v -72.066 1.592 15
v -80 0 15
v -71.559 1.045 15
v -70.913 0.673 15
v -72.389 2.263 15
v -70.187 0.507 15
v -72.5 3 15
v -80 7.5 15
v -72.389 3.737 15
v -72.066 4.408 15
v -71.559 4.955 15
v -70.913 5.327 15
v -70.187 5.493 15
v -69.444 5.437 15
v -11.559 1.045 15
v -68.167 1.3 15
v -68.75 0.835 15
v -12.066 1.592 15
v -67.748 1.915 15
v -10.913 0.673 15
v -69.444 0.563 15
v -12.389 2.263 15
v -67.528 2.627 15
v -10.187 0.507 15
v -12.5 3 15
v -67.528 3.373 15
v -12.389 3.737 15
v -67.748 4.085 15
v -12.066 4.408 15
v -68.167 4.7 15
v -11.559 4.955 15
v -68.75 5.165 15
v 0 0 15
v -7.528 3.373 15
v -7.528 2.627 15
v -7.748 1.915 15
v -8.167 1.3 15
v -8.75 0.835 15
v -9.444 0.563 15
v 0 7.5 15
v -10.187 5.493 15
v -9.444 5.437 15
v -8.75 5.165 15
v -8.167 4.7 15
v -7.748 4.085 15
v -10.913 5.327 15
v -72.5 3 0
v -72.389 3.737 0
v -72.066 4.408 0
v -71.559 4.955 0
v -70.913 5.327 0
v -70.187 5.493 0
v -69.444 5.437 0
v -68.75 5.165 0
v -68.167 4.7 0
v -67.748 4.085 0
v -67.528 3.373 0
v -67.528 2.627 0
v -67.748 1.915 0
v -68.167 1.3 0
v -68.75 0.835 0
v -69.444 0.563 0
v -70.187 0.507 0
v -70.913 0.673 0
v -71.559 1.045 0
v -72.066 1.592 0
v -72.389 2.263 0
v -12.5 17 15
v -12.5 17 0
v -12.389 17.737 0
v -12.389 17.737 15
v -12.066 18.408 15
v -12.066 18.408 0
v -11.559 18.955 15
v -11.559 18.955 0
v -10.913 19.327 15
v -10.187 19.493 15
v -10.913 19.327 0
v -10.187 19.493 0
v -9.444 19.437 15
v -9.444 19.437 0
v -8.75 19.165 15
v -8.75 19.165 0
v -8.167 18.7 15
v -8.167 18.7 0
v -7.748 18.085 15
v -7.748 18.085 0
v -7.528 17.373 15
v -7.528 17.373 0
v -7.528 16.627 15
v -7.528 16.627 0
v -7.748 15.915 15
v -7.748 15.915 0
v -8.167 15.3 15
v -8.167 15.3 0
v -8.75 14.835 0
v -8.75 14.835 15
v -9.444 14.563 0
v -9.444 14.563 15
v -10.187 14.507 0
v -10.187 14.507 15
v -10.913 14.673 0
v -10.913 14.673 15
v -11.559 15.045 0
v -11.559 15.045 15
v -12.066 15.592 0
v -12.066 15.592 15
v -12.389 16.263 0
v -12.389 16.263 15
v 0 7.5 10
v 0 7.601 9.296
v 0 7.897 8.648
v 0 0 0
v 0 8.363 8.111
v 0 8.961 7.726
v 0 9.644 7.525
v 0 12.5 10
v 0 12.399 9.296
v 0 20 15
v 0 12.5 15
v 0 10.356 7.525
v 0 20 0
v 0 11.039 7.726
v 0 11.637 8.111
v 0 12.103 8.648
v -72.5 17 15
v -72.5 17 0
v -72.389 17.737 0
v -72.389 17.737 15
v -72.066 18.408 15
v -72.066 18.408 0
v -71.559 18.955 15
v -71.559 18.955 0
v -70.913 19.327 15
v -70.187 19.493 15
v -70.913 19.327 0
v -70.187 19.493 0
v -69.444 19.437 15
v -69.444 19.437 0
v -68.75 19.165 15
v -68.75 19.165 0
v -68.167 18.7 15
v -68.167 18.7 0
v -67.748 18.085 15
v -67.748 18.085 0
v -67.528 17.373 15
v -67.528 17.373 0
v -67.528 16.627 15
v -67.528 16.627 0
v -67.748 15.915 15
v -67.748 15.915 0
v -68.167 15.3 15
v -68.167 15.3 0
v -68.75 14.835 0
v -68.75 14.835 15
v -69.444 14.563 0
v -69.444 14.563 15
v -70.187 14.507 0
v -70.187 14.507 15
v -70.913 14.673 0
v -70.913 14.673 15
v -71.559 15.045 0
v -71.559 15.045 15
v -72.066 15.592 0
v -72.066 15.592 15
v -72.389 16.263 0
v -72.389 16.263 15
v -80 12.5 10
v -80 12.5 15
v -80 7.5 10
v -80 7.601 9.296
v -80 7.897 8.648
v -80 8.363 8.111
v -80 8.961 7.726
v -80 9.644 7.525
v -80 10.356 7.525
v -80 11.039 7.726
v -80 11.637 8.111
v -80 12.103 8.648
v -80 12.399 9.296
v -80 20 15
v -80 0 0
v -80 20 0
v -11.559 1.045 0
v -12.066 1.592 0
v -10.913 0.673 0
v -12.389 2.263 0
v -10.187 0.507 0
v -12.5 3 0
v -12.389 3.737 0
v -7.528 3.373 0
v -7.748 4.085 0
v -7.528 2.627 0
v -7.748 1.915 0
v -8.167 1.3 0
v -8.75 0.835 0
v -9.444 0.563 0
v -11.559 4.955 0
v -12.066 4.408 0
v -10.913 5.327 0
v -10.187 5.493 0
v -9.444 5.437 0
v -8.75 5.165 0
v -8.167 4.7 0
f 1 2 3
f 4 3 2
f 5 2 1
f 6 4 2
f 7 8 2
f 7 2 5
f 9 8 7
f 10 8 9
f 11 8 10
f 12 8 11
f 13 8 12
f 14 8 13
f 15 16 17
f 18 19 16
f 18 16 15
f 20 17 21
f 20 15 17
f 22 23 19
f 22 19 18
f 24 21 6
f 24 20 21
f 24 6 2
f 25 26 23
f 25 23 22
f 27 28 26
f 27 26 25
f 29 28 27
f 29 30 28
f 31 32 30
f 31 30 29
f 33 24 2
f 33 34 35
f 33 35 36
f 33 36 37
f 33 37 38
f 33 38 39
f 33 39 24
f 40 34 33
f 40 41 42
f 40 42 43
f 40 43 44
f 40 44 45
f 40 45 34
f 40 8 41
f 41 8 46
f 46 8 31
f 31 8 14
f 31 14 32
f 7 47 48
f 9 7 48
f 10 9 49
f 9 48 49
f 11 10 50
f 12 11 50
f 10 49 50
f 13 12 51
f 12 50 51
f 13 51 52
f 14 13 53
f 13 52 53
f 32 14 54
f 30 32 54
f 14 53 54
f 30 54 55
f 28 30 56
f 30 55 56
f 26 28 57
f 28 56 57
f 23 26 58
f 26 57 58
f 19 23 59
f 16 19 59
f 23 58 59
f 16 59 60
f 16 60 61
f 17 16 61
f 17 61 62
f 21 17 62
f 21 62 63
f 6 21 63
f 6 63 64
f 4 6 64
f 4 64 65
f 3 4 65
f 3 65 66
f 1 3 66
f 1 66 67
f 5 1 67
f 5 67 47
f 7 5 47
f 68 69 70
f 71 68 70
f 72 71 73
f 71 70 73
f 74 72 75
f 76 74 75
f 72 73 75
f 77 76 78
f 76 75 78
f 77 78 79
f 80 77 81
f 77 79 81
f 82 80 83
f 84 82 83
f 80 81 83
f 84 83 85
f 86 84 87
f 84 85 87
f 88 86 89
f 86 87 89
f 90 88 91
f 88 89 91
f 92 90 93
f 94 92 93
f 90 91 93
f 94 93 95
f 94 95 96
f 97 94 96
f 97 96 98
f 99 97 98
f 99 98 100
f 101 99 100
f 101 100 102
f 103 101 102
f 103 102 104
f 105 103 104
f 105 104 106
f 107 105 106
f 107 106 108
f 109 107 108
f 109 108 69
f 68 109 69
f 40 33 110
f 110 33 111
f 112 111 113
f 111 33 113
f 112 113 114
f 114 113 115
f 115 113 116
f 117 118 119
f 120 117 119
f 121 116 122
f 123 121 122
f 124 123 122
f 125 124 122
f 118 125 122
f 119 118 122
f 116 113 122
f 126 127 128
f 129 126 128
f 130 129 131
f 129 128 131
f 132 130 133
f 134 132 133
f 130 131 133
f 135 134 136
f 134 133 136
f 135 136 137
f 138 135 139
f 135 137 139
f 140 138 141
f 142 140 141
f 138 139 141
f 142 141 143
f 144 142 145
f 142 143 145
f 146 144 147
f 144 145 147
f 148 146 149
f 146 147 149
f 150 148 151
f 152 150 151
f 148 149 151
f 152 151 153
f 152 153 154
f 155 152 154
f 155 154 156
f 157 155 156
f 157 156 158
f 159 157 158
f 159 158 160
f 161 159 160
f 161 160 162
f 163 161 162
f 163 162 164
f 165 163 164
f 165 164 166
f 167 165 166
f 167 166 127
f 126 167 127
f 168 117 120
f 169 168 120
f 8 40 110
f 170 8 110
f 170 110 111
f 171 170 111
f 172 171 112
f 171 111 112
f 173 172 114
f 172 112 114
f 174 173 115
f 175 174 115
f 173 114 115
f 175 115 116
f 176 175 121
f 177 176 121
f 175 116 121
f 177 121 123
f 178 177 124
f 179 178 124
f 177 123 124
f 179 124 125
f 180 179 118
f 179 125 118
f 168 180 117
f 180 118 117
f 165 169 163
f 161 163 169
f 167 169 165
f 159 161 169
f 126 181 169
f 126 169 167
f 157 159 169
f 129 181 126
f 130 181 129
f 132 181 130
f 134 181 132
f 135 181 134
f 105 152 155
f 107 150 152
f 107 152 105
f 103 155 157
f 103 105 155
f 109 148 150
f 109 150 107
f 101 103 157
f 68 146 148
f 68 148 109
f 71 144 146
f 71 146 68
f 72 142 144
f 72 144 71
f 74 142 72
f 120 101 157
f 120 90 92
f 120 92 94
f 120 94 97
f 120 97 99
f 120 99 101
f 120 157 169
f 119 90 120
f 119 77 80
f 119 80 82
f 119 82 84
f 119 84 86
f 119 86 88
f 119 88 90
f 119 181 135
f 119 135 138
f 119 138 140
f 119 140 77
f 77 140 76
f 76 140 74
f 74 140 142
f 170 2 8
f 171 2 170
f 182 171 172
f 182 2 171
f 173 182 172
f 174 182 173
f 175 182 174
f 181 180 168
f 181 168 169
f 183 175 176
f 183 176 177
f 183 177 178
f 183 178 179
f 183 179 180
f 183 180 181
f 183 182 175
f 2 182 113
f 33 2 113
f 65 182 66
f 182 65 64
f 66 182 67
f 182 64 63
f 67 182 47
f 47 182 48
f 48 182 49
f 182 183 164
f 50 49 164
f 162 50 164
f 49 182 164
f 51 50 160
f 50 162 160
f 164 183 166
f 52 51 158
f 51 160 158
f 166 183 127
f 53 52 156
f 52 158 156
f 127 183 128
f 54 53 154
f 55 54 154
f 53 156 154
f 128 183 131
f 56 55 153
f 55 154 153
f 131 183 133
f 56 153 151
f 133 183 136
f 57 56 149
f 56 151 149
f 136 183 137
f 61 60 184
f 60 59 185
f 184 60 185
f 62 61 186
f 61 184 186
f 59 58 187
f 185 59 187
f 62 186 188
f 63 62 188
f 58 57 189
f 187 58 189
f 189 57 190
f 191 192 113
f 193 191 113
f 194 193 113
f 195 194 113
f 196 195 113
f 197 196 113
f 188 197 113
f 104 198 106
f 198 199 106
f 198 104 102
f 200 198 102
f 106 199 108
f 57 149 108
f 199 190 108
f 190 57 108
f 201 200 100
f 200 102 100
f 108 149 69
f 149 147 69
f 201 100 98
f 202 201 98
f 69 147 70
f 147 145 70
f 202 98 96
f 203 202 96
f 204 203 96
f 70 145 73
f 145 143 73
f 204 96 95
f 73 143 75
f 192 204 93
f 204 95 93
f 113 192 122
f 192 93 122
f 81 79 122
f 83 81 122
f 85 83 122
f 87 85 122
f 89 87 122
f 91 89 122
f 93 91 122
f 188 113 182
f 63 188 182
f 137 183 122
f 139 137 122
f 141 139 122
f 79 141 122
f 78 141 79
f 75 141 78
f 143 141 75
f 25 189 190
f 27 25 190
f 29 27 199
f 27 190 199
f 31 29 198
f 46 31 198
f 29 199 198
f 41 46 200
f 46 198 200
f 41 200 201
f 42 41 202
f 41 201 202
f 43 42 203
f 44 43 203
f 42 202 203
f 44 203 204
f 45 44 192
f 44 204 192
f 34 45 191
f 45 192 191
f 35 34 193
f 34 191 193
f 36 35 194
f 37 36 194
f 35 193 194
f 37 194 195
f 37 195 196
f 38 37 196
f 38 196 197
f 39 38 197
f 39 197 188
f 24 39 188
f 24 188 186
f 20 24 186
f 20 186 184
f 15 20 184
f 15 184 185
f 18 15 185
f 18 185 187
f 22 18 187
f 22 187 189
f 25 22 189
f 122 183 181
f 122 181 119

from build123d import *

# Parameters (mm, degrees)
ESQUISSE1_W             = 80
ESQUISSE1_H             = 20
BOSS_EXTRU_1_DEPTH      = 15
ENL_V_MAT_EXTRU_1_DEPTH = 94
ESQUISSE3_R             = 2.5
ENL_V_MAT_EXTRU_2_DEPTH = 94


with BuildPart() as part:
    # Esquisse1 → Boss.-Extru.1 (new body)
    with BuildSketch(Plane.XY):
        with Locations((-40, 10)):
            Rectangle(ESQUISSE1_W, ESQUISSE1_H)
    extrude(amount=BOSS_EXTRU_1_DEPTH)

    # Esquisse2 → Enlèv. mat.-Extru.1 (cut)
    with BuildSketch(Plane(origin=(0, 0, 0), x_dir=(0, 0, -1), z_dir=(1, 0, 0))):
        with BuildLine():
            Line((-15, 7.5), (-10, 7.5))
            ThreePointArc((-10, 7.5), (-7.5, 10), (-10, 12.5))
            Line((-10, 12.5), (-15, 12.5))
            Line((-15, 12.5), (-15, 7.5))
        make_face()
    extrude(amount=-ENL_V_MAT_EXTRU_1_DEPTH, mode=Mode.SUBTRACT)

    # Esquisse3 → Enlèv. mat.-Extru.2 (cut)
    with BuildSketch(Plane(origin=(0, 0, 0), x_dir=(-1, 0, 0), z_dir=(0, 0, -1))):
        with Locations((10, 17)):
            Circle(ESQUISSE3_R)
        with Locations((10, 3)):
            Circle(ESQUISSE3_R)
        with Locations((70, 17)):
            Circle(ESQUISSE3_R)
        with Locations((70, 3)):
            Circle(ESQUISSE3_R)
    extrude(amount=-ENL_V_MAT_EXTRU_2_DEPTH, mode=Mode.SUBTRACT)


solid = part.part
